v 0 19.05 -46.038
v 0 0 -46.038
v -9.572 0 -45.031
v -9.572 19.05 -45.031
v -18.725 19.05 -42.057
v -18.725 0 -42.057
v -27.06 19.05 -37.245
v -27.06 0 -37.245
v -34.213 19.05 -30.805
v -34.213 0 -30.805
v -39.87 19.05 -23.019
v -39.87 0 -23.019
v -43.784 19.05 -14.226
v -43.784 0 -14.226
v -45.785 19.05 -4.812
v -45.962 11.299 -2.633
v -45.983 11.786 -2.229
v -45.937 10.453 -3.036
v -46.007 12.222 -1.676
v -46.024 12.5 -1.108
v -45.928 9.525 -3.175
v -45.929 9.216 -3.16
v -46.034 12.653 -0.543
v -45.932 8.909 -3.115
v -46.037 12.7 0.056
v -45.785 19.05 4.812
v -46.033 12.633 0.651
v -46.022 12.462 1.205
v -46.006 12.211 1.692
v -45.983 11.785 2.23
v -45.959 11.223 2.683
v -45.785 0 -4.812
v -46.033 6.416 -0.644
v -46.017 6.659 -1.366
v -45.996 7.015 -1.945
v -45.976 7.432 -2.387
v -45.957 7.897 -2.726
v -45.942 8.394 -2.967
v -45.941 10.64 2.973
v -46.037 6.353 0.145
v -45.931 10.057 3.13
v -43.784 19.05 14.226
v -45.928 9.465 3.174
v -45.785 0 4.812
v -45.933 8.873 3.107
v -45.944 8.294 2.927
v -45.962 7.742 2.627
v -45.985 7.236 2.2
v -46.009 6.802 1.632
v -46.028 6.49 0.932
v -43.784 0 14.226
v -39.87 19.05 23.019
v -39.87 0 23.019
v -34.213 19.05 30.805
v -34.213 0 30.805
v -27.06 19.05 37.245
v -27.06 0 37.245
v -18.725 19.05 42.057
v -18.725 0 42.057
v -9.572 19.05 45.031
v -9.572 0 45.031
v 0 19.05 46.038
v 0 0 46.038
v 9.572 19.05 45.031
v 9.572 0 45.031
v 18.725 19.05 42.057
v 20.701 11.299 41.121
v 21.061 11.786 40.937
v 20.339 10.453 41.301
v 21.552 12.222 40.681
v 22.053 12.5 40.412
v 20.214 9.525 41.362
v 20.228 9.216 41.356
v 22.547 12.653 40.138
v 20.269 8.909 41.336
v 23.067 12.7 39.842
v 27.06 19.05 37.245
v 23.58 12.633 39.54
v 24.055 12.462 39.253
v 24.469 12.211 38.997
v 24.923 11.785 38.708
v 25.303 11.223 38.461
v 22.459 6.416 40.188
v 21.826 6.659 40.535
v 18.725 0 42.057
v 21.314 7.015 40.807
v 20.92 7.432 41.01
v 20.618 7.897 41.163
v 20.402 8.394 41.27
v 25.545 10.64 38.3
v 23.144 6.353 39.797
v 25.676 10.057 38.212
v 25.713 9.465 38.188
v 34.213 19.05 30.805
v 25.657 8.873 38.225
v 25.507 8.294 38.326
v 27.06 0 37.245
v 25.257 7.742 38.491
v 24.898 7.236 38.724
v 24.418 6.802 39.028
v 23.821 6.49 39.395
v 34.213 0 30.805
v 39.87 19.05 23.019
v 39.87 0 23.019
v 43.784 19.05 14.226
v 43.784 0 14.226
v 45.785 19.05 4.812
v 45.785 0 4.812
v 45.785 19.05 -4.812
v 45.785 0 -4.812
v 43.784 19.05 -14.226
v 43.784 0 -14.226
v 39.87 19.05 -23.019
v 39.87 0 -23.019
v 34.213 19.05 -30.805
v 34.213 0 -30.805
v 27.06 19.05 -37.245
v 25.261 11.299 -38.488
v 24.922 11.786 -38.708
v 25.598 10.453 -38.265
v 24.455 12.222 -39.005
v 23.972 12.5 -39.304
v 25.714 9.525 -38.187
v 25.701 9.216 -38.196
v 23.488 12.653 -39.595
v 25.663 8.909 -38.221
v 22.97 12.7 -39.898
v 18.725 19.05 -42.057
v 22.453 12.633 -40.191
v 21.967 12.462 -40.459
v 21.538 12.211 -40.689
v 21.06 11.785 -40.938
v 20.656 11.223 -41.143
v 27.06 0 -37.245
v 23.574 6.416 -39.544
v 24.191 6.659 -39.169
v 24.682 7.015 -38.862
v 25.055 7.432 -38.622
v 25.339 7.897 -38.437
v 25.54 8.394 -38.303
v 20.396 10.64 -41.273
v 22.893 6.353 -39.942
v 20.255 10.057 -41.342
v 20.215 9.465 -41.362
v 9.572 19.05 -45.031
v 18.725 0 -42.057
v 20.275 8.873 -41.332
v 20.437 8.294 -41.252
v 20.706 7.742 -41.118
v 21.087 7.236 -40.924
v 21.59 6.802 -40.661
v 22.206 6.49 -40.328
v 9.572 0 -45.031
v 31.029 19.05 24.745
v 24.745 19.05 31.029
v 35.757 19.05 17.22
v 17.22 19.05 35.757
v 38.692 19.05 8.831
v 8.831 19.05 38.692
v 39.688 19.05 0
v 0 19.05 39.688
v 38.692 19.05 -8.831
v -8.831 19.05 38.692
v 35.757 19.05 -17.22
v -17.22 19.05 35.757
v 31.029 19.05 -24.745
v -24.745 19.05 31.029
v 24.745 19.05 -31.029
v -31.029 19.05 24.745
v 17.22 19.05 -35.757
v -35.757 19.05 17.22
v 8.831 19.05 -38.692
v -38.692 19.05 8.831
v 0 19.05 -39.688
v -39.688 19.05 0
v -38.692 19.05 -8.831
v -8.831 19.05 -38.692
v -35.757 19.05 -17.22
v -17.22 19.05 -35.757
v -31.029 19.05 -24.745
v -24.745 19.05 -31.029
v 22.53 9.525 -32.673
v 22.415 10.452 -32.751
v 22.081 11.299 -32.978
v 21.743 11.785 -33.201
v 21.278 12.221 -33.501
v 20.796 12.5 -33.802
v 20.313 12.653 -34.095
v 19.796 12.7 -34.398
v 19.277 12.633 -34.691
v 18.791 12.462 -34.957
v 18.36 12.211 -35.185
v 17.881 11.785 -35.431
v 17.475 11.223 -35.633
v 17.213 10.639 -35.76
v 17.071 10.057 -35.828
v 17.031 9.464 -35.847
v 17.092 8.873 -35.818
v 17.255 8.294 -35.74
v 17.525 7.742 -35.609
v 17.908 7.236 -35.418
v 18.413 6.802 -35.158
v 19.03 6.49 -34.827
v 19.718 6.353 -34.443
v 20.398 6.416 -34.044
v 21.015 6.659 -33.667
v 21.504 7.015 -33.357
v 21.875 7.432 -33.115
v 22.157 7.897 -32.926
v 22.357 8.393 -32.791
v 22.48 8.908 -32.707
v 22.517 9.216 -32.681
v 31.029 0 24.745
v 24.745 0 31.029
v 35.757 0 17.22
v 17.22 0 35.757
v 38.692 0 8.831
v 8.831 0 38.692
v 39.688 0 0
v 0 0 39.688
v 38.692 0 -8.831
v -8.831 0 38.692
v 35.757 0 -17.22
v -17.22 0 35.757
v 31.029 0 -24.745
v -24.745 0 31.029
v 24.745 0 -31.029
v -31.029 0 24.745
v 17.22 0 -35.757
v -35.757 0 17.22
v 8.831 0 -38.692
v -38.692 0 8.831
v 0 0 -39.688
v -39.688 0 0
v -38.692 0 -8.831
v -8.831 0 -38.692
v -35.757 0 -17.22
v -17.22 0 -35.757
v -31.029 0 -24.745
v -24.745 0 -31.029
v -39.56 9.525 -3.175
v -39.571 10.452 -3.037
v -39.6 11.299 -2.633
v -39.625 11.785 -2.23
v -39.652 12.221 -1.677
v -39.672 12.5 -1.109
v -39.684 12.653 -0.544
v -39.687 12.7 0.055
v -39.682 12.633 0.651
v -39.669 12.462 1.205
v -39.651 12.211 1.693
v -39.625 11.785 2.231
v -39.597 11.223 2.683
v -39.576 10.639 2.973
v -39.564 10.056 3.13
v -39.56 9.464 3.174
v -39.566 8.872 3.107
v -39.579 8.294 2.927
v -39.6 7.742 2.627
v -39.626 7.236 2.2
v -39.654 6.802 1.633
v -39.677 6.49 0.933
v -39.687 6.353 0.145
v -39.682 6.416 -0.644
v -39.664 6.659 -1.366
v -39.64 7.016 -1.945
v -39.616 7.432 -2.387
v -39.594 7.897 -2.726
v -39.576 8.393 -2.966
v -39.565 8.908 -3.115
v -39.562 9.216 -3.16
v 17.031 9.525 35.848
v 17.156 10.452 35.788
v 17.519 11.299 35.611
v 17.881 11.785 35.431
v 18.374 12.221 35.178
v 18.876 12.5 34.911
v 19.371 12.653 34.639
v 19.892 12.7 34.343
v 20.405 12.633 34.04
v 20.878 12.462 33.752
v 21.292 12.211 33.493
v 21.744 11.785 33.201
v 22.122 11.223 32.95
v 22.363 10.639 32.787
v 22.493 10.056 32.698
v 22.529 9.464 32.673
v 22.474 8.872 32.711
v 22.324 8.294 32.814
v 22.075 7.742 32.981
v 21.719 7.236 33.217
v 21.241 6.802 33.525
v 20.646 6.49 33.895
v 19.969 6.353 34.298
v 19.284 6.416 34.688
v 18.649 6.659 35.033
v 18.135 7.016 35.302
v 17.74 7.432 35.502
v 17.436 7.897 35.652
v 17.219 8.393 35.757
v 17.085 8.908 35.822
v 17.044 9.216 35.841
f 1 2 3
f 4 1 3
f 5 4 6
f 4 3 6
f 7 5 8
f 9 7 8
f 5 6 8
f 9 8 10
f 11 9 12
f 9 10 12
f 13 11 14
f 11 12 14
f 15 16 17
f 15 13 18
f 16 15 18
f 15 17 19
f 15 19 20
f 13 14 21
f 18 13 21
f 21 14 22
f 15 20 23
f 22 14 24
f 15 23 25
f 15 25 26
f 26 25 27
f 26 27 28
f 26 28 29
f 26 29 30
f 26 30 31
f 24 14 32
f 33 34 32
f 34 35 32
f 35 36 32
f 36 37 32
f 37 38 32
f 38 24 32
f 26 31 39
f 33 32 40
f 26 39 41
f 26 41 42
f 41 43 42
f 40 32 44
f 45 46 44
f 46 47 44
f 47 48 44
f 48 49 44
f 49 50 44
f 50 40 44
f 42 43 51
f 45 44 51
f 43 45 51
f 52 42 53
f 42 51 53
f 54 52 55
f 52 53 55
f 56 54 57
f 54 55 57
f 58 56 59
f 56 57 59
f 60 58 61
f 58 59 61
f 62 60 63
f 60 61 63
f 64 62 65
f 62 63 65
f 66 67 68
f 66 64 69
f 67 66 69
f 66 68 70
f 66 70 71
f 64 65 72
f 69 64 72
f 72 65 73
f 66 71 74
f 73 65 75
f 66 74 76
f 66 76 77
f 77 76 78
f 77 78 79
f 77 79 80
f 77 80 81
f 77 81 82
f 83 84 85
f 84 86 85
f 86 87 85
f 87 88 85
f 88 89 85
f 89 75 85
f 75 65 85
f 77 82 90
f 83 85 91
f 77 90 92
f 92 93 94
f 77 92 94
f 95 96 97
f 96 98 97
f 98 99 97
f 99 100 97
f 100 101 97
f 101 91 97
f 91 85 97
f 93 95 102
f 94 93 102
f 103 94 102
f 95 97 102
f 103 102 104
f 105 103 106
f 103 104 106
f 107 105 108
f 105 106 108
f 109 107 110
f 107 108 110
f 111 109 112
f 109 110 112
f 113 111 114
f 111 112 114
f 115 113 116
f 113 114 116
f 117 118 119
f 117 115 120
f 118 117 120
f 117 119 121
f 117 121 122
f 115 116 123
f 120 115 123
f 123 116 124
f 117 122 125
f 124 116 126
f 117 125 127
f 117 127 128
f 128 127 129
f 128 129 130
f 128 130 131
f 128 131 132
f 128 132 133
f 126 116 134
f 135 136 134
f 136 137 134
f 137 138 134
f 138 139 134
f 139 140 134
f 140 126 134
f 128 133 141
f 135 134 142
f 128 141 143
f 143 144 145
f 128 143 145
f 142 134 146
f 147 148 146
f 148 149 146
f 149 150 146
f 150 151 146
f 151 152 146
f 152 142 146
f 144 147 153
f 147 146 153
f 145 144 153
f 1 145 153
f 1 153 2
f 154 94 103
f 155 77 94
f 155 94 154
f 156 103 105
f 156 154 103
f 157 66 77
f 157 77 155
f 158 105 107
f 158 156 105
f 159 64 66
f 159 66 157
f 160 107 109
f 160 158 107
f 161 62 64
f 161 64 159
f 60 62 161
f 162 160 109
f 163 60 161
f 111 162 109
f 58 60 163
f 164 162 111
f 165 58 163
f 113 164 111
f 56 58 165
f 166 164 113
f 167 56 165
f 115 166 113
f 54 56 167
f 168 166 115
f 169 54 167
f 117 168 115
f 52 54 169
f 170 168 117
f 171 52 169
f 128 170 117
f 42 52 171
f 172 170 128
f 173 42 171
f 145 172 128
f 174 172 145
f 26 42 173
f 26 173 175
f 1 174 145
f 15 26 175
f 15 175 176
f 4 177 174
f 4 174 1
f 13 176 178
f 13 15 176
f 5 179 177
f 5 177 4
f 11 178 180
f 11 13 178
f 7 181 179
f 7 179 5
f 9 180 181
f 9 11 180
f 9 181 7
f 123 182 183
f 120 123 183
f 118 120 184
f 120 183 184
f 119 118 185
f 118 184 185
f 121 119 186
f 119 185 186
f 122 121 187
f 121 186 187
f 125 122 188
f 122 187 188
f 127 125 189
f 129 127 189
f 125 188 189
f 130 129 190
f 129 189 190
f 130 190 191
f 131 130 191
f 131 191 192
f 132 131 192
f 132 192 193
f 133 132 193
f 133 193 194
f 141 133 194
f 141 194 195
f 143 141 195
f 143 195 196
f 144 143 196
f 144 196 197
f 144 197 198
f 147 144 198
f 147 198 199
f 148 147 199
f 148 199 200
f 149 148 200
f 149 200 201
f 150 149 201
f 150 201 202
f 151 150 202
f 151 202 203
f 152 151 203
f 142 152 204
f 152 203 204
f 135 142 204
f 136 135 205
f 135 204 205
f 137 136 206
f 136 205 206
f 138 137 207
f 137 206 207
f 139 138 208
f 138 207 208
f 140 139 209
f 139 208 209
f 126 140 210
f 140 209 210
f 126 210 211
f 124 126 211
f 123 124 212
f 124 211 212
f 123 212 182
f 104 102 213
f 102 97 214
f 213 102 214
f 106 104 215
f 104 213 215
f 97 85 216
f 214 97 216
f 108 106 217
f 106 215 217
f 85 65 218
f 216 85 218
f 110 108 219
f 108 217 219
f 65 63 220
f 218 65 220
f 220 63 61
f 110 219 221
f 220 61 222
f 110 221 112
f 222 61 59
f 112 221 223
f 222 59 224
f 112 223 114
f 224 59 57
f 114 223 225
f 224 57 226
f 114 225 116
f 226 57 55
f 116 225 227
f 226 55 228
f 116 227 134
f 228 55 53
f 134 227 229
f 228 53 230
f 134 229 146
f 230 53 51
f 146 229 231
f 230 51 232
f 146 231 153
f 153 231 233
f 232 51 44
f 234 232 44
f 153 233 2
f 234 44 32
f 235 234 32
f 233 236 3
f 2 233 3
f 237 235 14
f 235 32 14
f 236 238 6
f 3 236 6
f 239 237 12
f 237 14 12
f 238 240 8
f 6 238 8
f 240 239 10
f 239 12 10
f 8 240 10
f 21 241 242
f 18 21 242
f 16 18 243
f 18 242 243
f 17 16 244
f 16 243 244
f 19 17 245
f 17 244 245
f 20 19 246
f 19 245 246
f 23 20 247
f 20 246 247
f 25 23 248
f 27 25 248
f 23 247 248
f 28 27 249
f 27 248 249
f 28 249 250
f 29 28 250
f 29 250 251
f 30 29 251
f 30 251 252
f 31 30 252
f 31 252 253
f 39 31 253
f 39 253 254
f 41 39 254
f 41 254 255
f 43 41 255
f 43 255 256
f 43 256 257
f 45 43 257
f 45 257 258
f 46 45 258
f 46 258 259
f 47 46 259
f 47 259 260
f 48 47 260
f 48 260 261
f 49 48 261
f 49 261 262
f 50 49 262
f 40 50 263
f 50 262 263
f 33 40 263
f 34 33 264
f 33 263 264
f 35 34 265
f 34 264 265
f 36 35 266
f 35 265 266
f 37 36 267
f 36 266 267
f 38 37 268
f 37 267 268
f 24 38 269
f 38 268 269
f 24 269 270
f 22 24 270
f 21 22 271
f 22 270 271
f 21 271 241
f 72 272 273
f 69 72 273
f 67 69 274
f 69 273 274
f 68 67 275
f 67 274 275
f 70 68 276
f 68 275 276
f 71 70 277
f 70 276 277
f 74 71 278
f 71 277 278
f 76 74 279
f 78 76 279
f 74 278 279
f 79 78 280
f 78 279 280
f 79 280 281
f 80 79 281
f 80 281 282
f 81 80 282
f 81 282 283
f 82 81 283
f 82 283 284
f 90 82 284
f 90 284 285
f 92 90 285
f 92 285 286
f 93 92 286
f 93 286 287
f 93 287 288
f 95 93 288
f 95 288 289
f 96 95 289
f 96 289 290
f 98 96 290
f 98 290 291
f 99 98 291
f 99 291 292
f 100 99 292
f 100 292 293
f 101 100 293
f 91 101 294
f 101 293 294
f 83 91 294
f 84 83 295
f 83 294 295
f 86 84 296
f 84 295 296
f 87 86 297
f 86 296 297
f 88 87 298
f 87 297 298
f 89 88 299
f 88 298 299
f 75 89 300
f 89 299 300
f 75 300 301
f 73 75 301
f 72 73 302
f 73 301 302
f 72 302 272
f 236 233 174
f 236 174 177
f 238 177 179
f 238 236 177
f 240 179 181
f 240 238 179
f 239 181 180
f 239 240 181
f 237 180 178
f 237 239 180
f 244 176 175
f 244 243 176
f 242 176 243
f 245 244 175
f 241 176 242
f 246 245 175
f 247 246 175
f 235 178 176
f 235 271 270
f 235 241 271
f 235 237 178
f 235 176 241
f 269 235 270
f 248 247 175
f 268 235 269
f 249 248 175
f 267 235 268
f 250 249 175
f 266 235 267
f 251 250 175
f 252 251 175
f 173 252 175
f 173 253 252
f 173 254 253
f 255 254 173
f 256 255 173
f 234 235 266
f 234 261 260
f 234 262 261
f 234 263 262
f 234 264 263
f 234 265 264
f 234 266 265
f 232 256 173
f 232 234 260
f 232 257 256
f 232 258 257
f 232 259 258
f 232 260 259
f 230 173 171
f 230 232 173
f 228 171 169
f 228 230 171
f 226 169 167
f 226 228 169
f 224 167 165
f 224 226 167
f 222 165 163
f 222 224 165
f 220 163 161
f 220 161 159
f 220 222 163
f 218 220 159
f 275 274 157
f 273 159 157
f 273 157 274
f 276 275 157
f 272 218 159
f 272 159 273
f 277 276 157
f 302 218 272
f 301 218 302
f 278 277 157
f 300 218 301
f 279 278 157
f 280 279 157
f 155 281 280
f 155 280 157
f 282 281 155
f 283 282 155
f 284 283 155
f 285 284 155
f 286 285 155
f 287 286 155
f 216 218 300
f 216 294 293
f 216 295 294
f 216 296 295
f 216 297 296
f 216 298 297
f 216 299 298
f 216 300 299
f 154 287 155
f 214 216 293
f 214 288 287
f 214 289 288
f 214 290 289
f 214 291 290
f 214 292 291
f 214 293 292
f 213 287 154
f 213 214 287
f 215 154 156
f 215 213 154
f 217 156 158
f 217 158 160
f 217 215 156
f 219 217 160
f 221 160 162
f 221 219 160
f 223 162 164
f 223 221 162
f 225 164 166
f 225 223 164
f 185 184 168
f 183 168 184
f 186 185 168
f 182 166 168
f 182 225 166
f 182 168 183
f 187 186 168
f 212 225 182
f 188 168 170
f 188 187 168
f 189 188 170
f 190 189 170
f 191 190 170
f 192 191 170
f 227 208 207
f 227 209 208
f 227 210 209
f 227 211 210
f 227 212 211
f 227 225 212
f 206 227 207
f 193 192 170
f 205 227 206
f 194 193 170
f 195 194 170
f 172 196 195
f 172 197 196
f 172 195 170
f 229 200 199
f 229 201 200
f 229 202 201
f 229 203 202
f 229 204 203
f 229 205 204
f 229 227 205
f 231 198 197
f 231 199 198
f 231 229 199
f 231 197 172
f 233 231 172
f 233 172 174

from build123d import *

# Parameters (mm, degrees)
SKETCH1_R           = 46.0375
SKETCH1_R_2         = 39.6875
BOSS_EXTRUDE1_DEPTH = 19.05
SKETCH4_R           = 3.175
CUT_EXTRUDE1_DEPTH  = 76.2
SKETCH5_R           = 3.175
CUT_EXTRUDE2_DEPTH  = 76.2
SKETCH3_R           = 3.175
CUT_EXTRUDE3_DEPTH  = 76.2


with BuildPart() as part:
    # Sketch1 → Boss-Extrude1 (new body)
    with BuildSketch(Plane(origin=(0, 0, 0), x_dir=(1, 0, 0), z_dir=(0, 1, 0))):
        with Locations(Location((0, 0, 0), (0, 0, 90))):
            Circle(SKETCH1_R)
        with Locations(Location((0, 0, 0), (0, 0, 90))):
            Circle(SKETCH1_R_2, mode=Mode.SUBTRACT)
    extrude(amount=BOSS_EXTRUDE1_DEPTH)

    # Sketch4 → Cut-Extrude1 (cut)
    with BuildSketch(Plane(origin=(0, 0, 0), x_dir=(0.8660254037844364, 0, 0.500000000000004), z_dir=(-0.500000000000004, 0, 0.8660254037844365))):
        with Locations((0, 9.525)):
            Circle(SKETCH4_R)
    extrude(amount=-CUT_EXTRUDE1_DEPTH, mode=Mode.SUBTRACT)

    # Sketch5 → Cut-Extrude2 (cut)
    with BuildSketch(Plane(origin=(0, 0, 0), x_dir=(-0.8660254037844363, 0, 0.5000000000000043), z_dir=(-0.5000000000000043, 0, -0.8660254037844363))):
        with Locations((0, 9.525)):
            Circle(SKETCH5_R)
    extrude(amount=-CUT_EXTRUDE2_DEPTH, mode=Mode.SUBTRACT)

    # Sketch3 → Cut-Extrude3 (cut)
    with BuildSketch(Plane(origin=(0, 0, 0), x_dir=(0, 0, -1), z_dir=(1, 0, 0))):
        with Locations((0, 9.525)):
            Circle(SKETCH3_R)
    extrude(amount=-CUT_EXTRUDE3_DEPTH, mode=Mode.SUBTRACT)


solid = part.part
